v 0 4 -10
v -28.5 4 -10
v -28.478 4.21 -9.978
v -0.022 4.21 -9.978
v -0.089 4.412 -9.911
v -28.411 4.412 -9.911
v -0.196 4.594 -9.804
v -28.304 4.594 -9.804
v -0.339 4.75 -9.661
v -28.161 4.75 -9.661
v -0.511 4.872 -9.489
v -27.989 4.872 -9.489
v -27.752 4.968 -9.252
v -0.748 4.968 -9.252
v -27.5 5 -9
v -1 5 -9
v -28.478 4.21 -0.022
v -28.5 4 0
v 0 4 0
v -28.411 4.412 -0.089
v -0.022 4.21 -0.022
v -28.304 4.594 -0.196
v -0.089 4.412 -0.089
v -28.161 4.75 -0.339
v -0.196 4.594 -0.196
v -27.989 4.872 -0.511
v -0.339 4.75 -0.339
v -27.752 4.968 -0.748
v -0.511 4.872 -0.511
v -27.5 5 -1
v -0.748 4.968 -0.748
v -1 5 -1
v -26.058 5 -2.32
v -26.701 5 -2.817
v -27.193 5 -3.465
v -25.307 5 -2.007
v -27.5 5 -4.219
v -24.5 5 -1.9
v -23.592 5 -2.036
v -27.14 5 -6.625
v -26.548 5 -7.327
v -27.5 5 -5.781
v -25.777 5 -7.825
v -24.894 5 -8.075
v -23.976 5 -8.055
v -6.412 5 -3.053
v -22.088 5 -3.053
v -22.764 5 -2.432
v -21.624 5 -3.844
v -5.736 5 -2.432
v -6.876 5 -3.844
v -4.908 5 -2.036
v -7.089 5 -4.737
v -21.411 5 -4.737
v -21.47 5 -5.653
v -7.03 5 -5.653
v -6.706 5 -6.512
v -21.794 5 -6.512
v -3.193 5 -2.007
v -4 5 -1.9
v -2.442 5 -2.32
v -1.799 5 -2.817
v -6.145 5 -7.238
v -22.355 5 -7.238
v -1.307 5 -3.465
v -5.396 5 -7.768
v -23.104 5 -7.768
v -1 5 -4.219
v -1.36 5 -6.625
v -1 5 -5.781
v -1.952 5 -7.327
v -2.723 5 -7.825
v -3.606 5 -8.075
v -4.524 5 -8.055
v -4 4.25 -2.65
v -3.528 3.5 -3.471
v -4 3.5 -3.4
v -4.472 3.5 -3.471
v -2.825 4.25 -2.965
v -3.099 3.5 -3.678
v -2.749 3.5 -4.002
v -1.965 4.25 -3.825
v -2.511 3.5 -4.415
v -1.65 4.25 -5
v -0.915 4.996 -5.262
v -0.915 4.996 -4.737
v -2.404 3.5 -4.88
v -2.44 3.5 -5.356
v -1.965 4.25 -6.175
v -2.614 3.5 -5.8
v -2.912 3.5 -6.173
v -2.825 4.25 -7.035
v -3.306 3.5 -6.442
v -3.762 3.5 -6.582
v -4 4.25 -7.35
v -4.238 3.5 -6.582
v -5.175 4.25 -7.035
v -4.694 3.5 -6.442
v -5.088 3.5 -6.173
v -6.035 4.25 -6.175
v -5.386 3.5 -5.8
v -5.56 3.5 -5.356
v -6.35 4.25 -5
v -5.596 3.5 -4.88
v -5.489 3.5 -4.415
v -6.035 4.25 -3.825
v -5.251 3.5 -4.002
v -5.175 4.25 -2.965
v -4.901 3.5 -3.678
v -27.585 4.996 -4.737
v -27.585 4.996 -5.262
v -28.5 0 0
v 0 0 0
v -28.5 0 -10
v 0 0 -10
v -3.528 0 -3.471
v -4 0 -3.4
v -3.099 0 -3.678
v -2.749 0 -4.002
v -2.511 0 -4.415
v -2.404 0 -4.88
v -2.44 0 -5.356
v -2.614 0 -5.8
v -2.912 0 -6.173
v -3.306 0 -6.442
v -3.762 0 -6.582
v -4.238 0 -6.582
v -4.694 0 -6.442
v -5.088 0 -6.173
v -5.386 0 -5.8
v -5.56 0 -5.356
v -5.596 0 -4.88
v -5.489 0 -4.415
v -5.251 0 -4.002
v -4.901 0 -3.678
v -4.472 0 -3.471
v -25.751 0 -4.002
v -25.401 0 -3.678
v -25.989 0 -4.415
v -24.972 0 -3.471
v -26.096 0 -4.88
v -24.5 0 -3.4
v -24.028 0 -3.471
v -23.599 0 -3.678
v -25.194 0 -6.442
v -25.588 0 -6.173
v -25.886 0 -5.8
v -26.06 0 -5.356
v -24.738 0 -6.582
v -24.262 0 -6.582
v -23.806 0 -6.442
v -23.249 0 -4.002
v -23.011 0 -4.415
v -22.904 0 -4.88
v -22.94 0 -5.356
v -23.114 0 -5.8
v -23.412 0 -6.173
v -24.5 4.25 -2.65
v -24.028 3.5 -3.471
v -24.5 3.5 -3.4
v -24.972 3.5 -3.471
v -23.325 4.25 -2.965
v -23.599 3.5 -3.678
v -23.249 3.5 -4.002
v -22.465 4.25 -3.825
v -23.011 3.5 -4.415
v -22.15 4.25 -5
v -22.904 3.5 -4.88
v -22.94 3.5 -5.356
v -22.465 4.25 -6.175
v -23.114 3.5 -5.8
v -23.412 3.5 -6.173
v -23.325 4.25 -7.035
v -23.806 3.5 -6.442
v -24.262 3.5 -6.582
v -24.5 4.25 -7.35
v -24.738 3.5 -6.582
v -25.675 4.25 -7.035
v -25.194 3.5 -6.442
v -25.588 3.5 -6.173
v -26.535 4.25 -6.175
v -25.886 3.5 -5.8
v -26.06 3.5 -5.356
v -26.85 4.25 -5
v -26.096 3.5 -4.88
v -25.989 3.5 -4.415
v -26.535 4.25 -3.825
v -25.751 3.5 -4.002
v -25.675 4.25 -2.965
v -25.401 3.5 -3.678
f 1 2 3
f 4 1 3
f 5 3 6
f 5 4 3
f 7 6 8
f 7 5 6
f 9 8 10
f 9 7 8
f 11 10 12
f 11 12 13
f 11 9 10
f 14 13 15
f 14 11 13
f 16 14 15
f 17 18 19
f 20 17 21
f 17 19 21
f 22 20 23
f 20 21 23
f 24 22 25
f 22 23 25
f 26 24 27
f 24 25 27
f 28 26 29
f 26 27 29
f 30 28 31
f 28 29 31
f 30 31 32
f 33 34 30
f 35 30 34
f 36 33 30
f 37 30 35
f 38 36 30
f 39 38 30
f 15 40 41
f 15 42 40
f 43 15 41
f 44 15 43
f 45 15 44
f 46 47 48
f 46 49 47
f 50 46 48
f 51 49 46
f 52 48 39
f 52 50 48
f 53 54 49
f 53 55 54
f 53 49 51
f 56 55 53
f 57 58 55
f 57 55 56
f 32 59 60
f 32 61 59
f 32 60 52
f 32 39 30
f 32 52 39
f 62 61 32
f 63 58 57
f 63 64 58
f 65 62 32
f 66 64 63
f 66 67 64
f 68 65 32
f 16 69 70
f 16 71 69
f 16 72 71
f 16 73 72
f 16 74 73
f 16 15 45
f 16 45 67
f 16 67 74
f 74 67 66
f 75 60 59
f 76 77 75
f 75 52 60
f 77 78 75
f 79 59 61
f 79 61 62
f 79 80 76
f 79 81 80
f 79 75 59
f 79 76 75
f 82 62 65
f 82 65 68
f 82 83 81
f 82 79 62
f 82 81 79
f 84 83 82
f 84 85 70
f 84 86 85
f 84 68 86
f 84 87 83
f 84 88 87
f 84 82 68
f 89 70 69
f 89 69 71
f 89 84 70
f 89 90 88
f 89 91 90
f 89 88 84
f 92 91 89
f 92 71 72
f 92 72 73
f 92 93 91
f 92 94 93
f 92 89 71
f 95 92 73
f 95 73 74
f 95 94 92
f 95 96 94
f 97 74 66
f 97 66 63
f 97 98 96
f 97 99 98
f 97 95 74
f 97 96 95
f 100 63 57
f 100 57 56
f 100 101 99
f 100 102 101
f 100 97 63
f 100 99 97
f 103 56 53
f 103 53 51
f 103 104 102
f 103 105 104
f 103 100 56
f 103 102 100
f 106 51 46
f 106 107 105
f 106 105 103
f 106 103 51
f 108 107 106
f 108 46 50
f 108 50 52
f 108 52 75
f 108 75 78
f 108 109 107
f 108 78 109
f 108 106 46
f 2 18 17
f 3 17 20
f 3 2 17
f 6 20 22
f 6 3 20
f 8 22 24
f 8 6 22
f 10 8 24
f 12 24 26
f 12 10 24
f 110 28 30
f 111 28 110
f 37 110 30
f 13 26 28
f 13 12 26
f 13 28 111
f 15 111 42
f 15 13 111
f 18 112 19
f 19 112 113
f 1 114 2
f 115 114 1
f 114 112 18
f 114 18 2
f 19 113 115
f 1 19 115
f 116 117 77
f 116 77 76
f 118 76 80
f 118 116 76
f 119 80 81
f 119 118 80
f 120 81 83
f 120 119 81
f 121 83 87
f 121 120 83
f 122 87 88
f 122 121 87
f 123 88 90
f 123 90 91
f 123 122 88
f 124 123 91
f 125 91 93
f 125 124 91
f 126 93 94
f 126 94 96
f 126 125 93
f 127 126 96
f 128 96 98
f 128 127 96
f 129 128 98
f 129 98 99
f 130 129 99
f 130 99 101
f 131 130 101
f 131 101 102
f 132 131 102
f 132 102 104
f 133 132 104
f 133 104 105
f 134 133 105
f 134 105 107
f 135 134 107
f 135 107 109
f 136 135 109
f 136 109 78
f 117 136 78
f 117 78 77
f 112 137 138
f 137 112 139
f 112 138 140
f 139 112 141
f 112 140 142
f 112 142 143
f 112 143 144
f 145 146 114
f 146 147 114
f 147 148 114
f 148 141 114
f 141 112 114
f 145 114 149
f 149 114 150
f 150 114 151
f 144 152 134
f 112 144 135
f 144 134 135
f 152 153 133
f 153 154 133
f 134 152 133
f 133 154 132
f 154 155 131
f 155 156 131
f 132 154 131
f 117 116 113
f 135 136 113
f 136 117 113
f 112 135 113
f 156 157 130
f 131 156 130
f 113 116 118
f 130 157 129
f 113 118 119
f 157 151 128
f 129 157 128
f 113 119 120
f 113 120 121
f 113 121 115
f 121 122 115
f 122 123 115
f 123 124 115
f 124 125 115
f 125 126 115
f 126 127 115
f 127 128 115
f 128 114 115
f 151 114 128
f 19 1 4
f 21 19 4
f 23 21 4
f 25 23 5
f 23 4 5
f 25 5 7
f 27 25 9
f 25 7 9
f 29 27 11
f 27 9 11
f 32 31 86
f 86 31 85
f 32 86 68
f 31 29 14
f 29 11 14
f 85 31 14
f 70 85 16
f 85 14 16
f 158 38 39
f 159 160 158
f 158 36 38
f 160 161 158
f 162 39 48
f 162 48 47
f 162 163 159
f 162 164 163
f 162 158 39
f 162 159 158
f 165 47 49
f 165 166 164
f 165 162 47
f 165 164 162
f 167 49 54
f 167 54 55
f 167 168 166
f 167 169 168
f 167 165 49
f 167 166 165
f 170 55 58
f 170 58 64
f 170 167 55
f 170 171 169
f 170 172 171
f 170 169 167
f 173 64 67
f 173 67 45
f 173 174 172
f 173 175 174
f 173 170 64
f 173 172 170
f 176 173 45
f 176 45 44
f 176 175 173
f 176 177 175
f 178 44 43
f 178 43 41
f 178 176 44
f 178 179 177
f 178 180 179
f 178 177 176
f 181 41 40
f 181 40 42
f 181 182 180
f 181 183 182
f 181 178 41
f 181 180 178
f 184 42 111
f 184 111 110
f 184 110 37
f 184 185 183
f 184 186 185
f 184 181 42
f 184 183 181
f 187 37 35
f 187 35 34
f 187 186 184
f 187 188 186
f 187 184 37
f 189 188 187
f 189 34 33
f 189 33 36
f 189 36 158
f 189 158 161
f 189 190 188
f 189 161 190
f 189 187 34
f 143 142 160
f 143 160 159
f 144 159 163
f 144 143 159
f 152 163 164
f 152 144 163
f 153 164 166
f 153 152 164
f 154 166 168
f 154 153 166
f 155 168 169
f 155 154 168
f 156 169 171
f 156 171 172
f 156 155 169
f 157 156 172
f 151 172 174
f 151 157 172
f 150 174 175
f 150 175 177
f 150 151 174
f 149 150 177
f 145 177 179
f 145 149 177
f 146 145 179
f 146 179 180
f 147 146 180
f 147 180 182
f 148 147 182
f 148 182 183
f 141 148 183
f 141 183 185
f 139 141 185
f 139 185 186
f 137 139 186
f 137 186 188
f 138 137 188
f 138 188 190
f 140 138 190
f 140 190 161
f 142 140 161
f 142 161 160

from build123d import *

# Parameters (mm, degrees)
SKETCH1_W           = 28.5
SKETCH1_H           = 10
SKETCH1_R           = 1.6
BOSS_EXTRUDE1_DEPTH = 5
FILLET1_R           = 1
CHAMFER1_SIZE       = 1.5


with BuildPart() as part:
    # Sketch1 → Boss-Extrude1 (new body)
    with BuildSketch(Plane(origin=(0, 0, 0), x_dir=(1, 0, 0), z_dir=(0, 1, 0))):
        with Locations((-14.25, 5)):
            Rectangle(SKETCH1_W, SKETCH1_H)
        with Locations(Location((-4, 5, 0), (0, 0, 270))):
            Circle(SKETCH1_R, mode=Mode.SUBTRACT)
        with Locations(Location((-24.5, 5, 0), (0, 0, 270))):
            Circle(SKETCH1_R, mode=Mode.SUBTRACT)
    extrude(amount=BOSS_EXTRUDE1_DEPTH)

    # Fillet1
    fillet1_edges = [part.edges().sort_by_distance(p)[0] for p in [
        (-28.5, 5, -5),
        (-14.25, 5, 0),
        (0, 5, -5),
        (-14.25, 5, -10),
    ]]
    fillet(fillet1_edges, radius=FILLET1_R)

    # Chamfer1
    # the kernel refuses this chamfer: 1.5 mm, written as the material it takes off along each edge
    with BuildSketch(Plane(origin=(-4, 5, -5), x_dir=(0, 0, 1), z_dir=(-1, 0, 0))) as chamfer1_piece_1:
        Polygon((1.6 + CHAMFER1_SIZE, 0), (1.6, -CHAMFER1_SIZE), (1.6, 0), align=None)
    revolve(axis=Axis((-4, 5, -5), (0, 1, 0)), mode=Mode.SUBTRACT)
    with BuildSketch(Plane(origin=(-24.5, 5, -5), x_dir=(0, 0, 1), z_dir=(-1, 0, 0))) as chamfer1_piece_2:
        Polygon((1.6 + CHAMFER1_SIZE, 0), (1.6, -CHAMFER1_SIZE), (1.6, 0), align=None)
    revolve(axis=Axis((-24.5, 5, -5), (0, 1, 0)), mode=Mode.SUBTRACT)


solid = part.part
